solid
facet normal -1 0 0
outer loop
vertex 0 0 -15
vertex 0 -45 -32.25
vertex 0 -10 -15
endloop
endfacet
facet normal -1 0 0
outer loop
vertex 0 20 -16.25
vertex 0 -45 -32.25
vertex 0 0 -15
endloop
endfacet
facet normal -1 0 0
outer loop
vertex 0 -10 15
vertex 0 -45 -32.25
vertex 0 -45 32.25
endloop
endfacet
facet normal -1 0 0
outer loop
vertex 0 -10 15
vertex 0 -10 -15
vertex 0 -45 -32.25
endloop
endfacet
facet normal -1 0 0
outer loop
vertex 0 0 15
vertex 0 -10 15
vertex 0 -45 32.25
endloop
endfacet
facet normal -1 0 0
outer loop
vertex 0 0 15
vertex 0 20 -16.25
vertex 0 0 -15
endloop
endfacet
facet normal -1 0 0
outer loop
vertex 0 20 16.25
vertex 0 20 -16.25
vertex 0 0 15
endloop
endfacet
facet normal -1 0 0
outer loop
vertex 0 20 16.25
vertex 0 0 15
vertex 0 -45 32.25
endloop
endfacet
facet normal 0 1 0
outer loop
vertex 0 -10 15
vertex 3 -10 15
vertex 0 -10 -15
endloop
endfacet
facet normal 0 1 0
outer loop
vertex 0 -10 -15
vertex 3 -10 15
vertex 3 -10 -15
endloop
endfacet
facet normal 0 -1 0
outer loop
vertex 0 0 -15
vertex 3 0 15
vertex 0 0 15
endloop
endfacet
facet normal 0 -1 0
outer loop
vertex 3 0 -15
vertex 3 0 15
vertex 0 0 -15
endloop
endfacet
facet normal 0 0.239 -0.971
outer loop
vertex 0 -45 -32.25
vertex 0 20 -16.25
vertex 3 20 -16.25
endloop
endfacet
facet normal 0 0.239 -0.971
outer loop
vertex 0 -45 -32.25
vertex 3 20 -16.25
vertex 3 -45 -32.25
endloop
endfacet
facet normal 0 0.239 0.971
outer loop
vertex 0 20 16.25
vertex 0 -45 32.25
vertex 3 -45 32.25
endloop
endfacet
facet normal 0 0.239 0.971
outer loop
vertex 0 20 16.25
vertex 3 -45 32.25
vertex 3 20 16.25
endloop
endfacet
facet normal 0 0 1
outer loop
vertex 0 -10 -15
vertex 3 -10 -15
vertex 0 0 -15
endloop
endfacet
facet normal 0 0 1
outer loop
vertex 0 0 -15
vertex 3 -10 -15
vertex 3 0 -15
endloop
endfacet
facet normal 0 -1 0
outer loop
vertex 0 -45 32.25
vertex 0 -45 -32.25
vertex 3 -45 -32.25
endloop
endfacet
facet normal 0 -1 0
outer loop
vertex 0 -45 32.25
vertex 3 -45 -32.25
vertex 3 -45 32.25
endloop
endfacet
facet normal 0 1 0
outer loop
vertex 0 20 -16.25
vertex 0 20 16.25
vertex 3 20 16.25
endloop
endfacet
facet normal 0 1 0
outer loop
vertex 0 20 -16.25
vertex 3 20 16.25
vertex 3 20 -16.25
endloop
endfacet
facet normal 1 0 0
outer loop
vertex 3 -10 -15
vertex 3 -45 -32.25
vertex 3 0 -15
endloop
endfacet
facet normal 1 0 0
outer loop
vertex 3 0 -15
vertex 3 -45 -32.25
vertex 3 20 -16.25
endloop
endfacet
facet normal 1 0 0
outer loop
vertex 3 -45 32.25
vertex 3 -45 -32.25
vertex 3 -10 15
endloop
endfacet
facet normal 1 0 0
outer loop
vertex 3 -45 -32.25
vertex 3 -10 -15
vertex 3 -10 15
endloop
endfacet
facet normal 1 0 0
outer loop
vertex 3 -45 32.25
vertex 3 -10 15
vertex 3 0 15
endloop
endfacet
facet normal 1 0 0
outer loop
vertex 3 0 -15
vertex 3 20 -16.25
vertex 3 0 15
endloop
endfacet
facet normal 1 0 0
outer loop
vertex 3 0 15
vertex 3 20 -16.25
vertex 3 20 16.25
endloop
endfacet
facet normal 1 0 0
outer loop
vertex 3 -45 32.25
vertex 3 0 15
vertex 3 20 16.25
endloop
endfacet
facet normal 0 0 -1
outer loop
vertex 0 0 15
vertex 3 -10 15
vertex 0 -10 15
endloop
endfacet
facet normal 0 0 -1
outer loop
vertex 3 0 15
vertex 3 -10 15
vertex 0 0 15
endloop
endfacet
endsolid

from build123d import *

# Parameters (mm, degrees)
SALIENTE_EXTRUIR1_DEPTH = 3
CROQUIS3_W              = 30
CROQUIS3_H              = 10
CORTAR_EXTRUIR1_DEPTH   = 4


with BuildPart() as part:
    # Croquis2 → Saliente-Extruir1 (new body)
    with BuildSketch(Plane(origin=(0, 0, 0), x_dir=(0, 0, -1), z_dir=(1, 0, 0))):
        Polygon((-16.25, 20), (16.25, 20), (32.25, -45), (-32.25, -45), align=None)
    extrude(amount=SALIENTE_EXTRUIR1_DEPTH)

    # Croquis3 → Cortar-Extruir1 (cut, through all)
    with BuildSketch(Plane(origin=(3, 0, 0), x_dir=(0, 0, -1), z_dir=(1, 0, 0))):
        with Locations((0, -5)):
            Rectangle(CROQUIS3_W, CROQUIS3_H)
    extrude(amount=-CORTAR_EXTRUIR1_DEPTH, mode=Mode.SUBTRACT)


solid = part.part
